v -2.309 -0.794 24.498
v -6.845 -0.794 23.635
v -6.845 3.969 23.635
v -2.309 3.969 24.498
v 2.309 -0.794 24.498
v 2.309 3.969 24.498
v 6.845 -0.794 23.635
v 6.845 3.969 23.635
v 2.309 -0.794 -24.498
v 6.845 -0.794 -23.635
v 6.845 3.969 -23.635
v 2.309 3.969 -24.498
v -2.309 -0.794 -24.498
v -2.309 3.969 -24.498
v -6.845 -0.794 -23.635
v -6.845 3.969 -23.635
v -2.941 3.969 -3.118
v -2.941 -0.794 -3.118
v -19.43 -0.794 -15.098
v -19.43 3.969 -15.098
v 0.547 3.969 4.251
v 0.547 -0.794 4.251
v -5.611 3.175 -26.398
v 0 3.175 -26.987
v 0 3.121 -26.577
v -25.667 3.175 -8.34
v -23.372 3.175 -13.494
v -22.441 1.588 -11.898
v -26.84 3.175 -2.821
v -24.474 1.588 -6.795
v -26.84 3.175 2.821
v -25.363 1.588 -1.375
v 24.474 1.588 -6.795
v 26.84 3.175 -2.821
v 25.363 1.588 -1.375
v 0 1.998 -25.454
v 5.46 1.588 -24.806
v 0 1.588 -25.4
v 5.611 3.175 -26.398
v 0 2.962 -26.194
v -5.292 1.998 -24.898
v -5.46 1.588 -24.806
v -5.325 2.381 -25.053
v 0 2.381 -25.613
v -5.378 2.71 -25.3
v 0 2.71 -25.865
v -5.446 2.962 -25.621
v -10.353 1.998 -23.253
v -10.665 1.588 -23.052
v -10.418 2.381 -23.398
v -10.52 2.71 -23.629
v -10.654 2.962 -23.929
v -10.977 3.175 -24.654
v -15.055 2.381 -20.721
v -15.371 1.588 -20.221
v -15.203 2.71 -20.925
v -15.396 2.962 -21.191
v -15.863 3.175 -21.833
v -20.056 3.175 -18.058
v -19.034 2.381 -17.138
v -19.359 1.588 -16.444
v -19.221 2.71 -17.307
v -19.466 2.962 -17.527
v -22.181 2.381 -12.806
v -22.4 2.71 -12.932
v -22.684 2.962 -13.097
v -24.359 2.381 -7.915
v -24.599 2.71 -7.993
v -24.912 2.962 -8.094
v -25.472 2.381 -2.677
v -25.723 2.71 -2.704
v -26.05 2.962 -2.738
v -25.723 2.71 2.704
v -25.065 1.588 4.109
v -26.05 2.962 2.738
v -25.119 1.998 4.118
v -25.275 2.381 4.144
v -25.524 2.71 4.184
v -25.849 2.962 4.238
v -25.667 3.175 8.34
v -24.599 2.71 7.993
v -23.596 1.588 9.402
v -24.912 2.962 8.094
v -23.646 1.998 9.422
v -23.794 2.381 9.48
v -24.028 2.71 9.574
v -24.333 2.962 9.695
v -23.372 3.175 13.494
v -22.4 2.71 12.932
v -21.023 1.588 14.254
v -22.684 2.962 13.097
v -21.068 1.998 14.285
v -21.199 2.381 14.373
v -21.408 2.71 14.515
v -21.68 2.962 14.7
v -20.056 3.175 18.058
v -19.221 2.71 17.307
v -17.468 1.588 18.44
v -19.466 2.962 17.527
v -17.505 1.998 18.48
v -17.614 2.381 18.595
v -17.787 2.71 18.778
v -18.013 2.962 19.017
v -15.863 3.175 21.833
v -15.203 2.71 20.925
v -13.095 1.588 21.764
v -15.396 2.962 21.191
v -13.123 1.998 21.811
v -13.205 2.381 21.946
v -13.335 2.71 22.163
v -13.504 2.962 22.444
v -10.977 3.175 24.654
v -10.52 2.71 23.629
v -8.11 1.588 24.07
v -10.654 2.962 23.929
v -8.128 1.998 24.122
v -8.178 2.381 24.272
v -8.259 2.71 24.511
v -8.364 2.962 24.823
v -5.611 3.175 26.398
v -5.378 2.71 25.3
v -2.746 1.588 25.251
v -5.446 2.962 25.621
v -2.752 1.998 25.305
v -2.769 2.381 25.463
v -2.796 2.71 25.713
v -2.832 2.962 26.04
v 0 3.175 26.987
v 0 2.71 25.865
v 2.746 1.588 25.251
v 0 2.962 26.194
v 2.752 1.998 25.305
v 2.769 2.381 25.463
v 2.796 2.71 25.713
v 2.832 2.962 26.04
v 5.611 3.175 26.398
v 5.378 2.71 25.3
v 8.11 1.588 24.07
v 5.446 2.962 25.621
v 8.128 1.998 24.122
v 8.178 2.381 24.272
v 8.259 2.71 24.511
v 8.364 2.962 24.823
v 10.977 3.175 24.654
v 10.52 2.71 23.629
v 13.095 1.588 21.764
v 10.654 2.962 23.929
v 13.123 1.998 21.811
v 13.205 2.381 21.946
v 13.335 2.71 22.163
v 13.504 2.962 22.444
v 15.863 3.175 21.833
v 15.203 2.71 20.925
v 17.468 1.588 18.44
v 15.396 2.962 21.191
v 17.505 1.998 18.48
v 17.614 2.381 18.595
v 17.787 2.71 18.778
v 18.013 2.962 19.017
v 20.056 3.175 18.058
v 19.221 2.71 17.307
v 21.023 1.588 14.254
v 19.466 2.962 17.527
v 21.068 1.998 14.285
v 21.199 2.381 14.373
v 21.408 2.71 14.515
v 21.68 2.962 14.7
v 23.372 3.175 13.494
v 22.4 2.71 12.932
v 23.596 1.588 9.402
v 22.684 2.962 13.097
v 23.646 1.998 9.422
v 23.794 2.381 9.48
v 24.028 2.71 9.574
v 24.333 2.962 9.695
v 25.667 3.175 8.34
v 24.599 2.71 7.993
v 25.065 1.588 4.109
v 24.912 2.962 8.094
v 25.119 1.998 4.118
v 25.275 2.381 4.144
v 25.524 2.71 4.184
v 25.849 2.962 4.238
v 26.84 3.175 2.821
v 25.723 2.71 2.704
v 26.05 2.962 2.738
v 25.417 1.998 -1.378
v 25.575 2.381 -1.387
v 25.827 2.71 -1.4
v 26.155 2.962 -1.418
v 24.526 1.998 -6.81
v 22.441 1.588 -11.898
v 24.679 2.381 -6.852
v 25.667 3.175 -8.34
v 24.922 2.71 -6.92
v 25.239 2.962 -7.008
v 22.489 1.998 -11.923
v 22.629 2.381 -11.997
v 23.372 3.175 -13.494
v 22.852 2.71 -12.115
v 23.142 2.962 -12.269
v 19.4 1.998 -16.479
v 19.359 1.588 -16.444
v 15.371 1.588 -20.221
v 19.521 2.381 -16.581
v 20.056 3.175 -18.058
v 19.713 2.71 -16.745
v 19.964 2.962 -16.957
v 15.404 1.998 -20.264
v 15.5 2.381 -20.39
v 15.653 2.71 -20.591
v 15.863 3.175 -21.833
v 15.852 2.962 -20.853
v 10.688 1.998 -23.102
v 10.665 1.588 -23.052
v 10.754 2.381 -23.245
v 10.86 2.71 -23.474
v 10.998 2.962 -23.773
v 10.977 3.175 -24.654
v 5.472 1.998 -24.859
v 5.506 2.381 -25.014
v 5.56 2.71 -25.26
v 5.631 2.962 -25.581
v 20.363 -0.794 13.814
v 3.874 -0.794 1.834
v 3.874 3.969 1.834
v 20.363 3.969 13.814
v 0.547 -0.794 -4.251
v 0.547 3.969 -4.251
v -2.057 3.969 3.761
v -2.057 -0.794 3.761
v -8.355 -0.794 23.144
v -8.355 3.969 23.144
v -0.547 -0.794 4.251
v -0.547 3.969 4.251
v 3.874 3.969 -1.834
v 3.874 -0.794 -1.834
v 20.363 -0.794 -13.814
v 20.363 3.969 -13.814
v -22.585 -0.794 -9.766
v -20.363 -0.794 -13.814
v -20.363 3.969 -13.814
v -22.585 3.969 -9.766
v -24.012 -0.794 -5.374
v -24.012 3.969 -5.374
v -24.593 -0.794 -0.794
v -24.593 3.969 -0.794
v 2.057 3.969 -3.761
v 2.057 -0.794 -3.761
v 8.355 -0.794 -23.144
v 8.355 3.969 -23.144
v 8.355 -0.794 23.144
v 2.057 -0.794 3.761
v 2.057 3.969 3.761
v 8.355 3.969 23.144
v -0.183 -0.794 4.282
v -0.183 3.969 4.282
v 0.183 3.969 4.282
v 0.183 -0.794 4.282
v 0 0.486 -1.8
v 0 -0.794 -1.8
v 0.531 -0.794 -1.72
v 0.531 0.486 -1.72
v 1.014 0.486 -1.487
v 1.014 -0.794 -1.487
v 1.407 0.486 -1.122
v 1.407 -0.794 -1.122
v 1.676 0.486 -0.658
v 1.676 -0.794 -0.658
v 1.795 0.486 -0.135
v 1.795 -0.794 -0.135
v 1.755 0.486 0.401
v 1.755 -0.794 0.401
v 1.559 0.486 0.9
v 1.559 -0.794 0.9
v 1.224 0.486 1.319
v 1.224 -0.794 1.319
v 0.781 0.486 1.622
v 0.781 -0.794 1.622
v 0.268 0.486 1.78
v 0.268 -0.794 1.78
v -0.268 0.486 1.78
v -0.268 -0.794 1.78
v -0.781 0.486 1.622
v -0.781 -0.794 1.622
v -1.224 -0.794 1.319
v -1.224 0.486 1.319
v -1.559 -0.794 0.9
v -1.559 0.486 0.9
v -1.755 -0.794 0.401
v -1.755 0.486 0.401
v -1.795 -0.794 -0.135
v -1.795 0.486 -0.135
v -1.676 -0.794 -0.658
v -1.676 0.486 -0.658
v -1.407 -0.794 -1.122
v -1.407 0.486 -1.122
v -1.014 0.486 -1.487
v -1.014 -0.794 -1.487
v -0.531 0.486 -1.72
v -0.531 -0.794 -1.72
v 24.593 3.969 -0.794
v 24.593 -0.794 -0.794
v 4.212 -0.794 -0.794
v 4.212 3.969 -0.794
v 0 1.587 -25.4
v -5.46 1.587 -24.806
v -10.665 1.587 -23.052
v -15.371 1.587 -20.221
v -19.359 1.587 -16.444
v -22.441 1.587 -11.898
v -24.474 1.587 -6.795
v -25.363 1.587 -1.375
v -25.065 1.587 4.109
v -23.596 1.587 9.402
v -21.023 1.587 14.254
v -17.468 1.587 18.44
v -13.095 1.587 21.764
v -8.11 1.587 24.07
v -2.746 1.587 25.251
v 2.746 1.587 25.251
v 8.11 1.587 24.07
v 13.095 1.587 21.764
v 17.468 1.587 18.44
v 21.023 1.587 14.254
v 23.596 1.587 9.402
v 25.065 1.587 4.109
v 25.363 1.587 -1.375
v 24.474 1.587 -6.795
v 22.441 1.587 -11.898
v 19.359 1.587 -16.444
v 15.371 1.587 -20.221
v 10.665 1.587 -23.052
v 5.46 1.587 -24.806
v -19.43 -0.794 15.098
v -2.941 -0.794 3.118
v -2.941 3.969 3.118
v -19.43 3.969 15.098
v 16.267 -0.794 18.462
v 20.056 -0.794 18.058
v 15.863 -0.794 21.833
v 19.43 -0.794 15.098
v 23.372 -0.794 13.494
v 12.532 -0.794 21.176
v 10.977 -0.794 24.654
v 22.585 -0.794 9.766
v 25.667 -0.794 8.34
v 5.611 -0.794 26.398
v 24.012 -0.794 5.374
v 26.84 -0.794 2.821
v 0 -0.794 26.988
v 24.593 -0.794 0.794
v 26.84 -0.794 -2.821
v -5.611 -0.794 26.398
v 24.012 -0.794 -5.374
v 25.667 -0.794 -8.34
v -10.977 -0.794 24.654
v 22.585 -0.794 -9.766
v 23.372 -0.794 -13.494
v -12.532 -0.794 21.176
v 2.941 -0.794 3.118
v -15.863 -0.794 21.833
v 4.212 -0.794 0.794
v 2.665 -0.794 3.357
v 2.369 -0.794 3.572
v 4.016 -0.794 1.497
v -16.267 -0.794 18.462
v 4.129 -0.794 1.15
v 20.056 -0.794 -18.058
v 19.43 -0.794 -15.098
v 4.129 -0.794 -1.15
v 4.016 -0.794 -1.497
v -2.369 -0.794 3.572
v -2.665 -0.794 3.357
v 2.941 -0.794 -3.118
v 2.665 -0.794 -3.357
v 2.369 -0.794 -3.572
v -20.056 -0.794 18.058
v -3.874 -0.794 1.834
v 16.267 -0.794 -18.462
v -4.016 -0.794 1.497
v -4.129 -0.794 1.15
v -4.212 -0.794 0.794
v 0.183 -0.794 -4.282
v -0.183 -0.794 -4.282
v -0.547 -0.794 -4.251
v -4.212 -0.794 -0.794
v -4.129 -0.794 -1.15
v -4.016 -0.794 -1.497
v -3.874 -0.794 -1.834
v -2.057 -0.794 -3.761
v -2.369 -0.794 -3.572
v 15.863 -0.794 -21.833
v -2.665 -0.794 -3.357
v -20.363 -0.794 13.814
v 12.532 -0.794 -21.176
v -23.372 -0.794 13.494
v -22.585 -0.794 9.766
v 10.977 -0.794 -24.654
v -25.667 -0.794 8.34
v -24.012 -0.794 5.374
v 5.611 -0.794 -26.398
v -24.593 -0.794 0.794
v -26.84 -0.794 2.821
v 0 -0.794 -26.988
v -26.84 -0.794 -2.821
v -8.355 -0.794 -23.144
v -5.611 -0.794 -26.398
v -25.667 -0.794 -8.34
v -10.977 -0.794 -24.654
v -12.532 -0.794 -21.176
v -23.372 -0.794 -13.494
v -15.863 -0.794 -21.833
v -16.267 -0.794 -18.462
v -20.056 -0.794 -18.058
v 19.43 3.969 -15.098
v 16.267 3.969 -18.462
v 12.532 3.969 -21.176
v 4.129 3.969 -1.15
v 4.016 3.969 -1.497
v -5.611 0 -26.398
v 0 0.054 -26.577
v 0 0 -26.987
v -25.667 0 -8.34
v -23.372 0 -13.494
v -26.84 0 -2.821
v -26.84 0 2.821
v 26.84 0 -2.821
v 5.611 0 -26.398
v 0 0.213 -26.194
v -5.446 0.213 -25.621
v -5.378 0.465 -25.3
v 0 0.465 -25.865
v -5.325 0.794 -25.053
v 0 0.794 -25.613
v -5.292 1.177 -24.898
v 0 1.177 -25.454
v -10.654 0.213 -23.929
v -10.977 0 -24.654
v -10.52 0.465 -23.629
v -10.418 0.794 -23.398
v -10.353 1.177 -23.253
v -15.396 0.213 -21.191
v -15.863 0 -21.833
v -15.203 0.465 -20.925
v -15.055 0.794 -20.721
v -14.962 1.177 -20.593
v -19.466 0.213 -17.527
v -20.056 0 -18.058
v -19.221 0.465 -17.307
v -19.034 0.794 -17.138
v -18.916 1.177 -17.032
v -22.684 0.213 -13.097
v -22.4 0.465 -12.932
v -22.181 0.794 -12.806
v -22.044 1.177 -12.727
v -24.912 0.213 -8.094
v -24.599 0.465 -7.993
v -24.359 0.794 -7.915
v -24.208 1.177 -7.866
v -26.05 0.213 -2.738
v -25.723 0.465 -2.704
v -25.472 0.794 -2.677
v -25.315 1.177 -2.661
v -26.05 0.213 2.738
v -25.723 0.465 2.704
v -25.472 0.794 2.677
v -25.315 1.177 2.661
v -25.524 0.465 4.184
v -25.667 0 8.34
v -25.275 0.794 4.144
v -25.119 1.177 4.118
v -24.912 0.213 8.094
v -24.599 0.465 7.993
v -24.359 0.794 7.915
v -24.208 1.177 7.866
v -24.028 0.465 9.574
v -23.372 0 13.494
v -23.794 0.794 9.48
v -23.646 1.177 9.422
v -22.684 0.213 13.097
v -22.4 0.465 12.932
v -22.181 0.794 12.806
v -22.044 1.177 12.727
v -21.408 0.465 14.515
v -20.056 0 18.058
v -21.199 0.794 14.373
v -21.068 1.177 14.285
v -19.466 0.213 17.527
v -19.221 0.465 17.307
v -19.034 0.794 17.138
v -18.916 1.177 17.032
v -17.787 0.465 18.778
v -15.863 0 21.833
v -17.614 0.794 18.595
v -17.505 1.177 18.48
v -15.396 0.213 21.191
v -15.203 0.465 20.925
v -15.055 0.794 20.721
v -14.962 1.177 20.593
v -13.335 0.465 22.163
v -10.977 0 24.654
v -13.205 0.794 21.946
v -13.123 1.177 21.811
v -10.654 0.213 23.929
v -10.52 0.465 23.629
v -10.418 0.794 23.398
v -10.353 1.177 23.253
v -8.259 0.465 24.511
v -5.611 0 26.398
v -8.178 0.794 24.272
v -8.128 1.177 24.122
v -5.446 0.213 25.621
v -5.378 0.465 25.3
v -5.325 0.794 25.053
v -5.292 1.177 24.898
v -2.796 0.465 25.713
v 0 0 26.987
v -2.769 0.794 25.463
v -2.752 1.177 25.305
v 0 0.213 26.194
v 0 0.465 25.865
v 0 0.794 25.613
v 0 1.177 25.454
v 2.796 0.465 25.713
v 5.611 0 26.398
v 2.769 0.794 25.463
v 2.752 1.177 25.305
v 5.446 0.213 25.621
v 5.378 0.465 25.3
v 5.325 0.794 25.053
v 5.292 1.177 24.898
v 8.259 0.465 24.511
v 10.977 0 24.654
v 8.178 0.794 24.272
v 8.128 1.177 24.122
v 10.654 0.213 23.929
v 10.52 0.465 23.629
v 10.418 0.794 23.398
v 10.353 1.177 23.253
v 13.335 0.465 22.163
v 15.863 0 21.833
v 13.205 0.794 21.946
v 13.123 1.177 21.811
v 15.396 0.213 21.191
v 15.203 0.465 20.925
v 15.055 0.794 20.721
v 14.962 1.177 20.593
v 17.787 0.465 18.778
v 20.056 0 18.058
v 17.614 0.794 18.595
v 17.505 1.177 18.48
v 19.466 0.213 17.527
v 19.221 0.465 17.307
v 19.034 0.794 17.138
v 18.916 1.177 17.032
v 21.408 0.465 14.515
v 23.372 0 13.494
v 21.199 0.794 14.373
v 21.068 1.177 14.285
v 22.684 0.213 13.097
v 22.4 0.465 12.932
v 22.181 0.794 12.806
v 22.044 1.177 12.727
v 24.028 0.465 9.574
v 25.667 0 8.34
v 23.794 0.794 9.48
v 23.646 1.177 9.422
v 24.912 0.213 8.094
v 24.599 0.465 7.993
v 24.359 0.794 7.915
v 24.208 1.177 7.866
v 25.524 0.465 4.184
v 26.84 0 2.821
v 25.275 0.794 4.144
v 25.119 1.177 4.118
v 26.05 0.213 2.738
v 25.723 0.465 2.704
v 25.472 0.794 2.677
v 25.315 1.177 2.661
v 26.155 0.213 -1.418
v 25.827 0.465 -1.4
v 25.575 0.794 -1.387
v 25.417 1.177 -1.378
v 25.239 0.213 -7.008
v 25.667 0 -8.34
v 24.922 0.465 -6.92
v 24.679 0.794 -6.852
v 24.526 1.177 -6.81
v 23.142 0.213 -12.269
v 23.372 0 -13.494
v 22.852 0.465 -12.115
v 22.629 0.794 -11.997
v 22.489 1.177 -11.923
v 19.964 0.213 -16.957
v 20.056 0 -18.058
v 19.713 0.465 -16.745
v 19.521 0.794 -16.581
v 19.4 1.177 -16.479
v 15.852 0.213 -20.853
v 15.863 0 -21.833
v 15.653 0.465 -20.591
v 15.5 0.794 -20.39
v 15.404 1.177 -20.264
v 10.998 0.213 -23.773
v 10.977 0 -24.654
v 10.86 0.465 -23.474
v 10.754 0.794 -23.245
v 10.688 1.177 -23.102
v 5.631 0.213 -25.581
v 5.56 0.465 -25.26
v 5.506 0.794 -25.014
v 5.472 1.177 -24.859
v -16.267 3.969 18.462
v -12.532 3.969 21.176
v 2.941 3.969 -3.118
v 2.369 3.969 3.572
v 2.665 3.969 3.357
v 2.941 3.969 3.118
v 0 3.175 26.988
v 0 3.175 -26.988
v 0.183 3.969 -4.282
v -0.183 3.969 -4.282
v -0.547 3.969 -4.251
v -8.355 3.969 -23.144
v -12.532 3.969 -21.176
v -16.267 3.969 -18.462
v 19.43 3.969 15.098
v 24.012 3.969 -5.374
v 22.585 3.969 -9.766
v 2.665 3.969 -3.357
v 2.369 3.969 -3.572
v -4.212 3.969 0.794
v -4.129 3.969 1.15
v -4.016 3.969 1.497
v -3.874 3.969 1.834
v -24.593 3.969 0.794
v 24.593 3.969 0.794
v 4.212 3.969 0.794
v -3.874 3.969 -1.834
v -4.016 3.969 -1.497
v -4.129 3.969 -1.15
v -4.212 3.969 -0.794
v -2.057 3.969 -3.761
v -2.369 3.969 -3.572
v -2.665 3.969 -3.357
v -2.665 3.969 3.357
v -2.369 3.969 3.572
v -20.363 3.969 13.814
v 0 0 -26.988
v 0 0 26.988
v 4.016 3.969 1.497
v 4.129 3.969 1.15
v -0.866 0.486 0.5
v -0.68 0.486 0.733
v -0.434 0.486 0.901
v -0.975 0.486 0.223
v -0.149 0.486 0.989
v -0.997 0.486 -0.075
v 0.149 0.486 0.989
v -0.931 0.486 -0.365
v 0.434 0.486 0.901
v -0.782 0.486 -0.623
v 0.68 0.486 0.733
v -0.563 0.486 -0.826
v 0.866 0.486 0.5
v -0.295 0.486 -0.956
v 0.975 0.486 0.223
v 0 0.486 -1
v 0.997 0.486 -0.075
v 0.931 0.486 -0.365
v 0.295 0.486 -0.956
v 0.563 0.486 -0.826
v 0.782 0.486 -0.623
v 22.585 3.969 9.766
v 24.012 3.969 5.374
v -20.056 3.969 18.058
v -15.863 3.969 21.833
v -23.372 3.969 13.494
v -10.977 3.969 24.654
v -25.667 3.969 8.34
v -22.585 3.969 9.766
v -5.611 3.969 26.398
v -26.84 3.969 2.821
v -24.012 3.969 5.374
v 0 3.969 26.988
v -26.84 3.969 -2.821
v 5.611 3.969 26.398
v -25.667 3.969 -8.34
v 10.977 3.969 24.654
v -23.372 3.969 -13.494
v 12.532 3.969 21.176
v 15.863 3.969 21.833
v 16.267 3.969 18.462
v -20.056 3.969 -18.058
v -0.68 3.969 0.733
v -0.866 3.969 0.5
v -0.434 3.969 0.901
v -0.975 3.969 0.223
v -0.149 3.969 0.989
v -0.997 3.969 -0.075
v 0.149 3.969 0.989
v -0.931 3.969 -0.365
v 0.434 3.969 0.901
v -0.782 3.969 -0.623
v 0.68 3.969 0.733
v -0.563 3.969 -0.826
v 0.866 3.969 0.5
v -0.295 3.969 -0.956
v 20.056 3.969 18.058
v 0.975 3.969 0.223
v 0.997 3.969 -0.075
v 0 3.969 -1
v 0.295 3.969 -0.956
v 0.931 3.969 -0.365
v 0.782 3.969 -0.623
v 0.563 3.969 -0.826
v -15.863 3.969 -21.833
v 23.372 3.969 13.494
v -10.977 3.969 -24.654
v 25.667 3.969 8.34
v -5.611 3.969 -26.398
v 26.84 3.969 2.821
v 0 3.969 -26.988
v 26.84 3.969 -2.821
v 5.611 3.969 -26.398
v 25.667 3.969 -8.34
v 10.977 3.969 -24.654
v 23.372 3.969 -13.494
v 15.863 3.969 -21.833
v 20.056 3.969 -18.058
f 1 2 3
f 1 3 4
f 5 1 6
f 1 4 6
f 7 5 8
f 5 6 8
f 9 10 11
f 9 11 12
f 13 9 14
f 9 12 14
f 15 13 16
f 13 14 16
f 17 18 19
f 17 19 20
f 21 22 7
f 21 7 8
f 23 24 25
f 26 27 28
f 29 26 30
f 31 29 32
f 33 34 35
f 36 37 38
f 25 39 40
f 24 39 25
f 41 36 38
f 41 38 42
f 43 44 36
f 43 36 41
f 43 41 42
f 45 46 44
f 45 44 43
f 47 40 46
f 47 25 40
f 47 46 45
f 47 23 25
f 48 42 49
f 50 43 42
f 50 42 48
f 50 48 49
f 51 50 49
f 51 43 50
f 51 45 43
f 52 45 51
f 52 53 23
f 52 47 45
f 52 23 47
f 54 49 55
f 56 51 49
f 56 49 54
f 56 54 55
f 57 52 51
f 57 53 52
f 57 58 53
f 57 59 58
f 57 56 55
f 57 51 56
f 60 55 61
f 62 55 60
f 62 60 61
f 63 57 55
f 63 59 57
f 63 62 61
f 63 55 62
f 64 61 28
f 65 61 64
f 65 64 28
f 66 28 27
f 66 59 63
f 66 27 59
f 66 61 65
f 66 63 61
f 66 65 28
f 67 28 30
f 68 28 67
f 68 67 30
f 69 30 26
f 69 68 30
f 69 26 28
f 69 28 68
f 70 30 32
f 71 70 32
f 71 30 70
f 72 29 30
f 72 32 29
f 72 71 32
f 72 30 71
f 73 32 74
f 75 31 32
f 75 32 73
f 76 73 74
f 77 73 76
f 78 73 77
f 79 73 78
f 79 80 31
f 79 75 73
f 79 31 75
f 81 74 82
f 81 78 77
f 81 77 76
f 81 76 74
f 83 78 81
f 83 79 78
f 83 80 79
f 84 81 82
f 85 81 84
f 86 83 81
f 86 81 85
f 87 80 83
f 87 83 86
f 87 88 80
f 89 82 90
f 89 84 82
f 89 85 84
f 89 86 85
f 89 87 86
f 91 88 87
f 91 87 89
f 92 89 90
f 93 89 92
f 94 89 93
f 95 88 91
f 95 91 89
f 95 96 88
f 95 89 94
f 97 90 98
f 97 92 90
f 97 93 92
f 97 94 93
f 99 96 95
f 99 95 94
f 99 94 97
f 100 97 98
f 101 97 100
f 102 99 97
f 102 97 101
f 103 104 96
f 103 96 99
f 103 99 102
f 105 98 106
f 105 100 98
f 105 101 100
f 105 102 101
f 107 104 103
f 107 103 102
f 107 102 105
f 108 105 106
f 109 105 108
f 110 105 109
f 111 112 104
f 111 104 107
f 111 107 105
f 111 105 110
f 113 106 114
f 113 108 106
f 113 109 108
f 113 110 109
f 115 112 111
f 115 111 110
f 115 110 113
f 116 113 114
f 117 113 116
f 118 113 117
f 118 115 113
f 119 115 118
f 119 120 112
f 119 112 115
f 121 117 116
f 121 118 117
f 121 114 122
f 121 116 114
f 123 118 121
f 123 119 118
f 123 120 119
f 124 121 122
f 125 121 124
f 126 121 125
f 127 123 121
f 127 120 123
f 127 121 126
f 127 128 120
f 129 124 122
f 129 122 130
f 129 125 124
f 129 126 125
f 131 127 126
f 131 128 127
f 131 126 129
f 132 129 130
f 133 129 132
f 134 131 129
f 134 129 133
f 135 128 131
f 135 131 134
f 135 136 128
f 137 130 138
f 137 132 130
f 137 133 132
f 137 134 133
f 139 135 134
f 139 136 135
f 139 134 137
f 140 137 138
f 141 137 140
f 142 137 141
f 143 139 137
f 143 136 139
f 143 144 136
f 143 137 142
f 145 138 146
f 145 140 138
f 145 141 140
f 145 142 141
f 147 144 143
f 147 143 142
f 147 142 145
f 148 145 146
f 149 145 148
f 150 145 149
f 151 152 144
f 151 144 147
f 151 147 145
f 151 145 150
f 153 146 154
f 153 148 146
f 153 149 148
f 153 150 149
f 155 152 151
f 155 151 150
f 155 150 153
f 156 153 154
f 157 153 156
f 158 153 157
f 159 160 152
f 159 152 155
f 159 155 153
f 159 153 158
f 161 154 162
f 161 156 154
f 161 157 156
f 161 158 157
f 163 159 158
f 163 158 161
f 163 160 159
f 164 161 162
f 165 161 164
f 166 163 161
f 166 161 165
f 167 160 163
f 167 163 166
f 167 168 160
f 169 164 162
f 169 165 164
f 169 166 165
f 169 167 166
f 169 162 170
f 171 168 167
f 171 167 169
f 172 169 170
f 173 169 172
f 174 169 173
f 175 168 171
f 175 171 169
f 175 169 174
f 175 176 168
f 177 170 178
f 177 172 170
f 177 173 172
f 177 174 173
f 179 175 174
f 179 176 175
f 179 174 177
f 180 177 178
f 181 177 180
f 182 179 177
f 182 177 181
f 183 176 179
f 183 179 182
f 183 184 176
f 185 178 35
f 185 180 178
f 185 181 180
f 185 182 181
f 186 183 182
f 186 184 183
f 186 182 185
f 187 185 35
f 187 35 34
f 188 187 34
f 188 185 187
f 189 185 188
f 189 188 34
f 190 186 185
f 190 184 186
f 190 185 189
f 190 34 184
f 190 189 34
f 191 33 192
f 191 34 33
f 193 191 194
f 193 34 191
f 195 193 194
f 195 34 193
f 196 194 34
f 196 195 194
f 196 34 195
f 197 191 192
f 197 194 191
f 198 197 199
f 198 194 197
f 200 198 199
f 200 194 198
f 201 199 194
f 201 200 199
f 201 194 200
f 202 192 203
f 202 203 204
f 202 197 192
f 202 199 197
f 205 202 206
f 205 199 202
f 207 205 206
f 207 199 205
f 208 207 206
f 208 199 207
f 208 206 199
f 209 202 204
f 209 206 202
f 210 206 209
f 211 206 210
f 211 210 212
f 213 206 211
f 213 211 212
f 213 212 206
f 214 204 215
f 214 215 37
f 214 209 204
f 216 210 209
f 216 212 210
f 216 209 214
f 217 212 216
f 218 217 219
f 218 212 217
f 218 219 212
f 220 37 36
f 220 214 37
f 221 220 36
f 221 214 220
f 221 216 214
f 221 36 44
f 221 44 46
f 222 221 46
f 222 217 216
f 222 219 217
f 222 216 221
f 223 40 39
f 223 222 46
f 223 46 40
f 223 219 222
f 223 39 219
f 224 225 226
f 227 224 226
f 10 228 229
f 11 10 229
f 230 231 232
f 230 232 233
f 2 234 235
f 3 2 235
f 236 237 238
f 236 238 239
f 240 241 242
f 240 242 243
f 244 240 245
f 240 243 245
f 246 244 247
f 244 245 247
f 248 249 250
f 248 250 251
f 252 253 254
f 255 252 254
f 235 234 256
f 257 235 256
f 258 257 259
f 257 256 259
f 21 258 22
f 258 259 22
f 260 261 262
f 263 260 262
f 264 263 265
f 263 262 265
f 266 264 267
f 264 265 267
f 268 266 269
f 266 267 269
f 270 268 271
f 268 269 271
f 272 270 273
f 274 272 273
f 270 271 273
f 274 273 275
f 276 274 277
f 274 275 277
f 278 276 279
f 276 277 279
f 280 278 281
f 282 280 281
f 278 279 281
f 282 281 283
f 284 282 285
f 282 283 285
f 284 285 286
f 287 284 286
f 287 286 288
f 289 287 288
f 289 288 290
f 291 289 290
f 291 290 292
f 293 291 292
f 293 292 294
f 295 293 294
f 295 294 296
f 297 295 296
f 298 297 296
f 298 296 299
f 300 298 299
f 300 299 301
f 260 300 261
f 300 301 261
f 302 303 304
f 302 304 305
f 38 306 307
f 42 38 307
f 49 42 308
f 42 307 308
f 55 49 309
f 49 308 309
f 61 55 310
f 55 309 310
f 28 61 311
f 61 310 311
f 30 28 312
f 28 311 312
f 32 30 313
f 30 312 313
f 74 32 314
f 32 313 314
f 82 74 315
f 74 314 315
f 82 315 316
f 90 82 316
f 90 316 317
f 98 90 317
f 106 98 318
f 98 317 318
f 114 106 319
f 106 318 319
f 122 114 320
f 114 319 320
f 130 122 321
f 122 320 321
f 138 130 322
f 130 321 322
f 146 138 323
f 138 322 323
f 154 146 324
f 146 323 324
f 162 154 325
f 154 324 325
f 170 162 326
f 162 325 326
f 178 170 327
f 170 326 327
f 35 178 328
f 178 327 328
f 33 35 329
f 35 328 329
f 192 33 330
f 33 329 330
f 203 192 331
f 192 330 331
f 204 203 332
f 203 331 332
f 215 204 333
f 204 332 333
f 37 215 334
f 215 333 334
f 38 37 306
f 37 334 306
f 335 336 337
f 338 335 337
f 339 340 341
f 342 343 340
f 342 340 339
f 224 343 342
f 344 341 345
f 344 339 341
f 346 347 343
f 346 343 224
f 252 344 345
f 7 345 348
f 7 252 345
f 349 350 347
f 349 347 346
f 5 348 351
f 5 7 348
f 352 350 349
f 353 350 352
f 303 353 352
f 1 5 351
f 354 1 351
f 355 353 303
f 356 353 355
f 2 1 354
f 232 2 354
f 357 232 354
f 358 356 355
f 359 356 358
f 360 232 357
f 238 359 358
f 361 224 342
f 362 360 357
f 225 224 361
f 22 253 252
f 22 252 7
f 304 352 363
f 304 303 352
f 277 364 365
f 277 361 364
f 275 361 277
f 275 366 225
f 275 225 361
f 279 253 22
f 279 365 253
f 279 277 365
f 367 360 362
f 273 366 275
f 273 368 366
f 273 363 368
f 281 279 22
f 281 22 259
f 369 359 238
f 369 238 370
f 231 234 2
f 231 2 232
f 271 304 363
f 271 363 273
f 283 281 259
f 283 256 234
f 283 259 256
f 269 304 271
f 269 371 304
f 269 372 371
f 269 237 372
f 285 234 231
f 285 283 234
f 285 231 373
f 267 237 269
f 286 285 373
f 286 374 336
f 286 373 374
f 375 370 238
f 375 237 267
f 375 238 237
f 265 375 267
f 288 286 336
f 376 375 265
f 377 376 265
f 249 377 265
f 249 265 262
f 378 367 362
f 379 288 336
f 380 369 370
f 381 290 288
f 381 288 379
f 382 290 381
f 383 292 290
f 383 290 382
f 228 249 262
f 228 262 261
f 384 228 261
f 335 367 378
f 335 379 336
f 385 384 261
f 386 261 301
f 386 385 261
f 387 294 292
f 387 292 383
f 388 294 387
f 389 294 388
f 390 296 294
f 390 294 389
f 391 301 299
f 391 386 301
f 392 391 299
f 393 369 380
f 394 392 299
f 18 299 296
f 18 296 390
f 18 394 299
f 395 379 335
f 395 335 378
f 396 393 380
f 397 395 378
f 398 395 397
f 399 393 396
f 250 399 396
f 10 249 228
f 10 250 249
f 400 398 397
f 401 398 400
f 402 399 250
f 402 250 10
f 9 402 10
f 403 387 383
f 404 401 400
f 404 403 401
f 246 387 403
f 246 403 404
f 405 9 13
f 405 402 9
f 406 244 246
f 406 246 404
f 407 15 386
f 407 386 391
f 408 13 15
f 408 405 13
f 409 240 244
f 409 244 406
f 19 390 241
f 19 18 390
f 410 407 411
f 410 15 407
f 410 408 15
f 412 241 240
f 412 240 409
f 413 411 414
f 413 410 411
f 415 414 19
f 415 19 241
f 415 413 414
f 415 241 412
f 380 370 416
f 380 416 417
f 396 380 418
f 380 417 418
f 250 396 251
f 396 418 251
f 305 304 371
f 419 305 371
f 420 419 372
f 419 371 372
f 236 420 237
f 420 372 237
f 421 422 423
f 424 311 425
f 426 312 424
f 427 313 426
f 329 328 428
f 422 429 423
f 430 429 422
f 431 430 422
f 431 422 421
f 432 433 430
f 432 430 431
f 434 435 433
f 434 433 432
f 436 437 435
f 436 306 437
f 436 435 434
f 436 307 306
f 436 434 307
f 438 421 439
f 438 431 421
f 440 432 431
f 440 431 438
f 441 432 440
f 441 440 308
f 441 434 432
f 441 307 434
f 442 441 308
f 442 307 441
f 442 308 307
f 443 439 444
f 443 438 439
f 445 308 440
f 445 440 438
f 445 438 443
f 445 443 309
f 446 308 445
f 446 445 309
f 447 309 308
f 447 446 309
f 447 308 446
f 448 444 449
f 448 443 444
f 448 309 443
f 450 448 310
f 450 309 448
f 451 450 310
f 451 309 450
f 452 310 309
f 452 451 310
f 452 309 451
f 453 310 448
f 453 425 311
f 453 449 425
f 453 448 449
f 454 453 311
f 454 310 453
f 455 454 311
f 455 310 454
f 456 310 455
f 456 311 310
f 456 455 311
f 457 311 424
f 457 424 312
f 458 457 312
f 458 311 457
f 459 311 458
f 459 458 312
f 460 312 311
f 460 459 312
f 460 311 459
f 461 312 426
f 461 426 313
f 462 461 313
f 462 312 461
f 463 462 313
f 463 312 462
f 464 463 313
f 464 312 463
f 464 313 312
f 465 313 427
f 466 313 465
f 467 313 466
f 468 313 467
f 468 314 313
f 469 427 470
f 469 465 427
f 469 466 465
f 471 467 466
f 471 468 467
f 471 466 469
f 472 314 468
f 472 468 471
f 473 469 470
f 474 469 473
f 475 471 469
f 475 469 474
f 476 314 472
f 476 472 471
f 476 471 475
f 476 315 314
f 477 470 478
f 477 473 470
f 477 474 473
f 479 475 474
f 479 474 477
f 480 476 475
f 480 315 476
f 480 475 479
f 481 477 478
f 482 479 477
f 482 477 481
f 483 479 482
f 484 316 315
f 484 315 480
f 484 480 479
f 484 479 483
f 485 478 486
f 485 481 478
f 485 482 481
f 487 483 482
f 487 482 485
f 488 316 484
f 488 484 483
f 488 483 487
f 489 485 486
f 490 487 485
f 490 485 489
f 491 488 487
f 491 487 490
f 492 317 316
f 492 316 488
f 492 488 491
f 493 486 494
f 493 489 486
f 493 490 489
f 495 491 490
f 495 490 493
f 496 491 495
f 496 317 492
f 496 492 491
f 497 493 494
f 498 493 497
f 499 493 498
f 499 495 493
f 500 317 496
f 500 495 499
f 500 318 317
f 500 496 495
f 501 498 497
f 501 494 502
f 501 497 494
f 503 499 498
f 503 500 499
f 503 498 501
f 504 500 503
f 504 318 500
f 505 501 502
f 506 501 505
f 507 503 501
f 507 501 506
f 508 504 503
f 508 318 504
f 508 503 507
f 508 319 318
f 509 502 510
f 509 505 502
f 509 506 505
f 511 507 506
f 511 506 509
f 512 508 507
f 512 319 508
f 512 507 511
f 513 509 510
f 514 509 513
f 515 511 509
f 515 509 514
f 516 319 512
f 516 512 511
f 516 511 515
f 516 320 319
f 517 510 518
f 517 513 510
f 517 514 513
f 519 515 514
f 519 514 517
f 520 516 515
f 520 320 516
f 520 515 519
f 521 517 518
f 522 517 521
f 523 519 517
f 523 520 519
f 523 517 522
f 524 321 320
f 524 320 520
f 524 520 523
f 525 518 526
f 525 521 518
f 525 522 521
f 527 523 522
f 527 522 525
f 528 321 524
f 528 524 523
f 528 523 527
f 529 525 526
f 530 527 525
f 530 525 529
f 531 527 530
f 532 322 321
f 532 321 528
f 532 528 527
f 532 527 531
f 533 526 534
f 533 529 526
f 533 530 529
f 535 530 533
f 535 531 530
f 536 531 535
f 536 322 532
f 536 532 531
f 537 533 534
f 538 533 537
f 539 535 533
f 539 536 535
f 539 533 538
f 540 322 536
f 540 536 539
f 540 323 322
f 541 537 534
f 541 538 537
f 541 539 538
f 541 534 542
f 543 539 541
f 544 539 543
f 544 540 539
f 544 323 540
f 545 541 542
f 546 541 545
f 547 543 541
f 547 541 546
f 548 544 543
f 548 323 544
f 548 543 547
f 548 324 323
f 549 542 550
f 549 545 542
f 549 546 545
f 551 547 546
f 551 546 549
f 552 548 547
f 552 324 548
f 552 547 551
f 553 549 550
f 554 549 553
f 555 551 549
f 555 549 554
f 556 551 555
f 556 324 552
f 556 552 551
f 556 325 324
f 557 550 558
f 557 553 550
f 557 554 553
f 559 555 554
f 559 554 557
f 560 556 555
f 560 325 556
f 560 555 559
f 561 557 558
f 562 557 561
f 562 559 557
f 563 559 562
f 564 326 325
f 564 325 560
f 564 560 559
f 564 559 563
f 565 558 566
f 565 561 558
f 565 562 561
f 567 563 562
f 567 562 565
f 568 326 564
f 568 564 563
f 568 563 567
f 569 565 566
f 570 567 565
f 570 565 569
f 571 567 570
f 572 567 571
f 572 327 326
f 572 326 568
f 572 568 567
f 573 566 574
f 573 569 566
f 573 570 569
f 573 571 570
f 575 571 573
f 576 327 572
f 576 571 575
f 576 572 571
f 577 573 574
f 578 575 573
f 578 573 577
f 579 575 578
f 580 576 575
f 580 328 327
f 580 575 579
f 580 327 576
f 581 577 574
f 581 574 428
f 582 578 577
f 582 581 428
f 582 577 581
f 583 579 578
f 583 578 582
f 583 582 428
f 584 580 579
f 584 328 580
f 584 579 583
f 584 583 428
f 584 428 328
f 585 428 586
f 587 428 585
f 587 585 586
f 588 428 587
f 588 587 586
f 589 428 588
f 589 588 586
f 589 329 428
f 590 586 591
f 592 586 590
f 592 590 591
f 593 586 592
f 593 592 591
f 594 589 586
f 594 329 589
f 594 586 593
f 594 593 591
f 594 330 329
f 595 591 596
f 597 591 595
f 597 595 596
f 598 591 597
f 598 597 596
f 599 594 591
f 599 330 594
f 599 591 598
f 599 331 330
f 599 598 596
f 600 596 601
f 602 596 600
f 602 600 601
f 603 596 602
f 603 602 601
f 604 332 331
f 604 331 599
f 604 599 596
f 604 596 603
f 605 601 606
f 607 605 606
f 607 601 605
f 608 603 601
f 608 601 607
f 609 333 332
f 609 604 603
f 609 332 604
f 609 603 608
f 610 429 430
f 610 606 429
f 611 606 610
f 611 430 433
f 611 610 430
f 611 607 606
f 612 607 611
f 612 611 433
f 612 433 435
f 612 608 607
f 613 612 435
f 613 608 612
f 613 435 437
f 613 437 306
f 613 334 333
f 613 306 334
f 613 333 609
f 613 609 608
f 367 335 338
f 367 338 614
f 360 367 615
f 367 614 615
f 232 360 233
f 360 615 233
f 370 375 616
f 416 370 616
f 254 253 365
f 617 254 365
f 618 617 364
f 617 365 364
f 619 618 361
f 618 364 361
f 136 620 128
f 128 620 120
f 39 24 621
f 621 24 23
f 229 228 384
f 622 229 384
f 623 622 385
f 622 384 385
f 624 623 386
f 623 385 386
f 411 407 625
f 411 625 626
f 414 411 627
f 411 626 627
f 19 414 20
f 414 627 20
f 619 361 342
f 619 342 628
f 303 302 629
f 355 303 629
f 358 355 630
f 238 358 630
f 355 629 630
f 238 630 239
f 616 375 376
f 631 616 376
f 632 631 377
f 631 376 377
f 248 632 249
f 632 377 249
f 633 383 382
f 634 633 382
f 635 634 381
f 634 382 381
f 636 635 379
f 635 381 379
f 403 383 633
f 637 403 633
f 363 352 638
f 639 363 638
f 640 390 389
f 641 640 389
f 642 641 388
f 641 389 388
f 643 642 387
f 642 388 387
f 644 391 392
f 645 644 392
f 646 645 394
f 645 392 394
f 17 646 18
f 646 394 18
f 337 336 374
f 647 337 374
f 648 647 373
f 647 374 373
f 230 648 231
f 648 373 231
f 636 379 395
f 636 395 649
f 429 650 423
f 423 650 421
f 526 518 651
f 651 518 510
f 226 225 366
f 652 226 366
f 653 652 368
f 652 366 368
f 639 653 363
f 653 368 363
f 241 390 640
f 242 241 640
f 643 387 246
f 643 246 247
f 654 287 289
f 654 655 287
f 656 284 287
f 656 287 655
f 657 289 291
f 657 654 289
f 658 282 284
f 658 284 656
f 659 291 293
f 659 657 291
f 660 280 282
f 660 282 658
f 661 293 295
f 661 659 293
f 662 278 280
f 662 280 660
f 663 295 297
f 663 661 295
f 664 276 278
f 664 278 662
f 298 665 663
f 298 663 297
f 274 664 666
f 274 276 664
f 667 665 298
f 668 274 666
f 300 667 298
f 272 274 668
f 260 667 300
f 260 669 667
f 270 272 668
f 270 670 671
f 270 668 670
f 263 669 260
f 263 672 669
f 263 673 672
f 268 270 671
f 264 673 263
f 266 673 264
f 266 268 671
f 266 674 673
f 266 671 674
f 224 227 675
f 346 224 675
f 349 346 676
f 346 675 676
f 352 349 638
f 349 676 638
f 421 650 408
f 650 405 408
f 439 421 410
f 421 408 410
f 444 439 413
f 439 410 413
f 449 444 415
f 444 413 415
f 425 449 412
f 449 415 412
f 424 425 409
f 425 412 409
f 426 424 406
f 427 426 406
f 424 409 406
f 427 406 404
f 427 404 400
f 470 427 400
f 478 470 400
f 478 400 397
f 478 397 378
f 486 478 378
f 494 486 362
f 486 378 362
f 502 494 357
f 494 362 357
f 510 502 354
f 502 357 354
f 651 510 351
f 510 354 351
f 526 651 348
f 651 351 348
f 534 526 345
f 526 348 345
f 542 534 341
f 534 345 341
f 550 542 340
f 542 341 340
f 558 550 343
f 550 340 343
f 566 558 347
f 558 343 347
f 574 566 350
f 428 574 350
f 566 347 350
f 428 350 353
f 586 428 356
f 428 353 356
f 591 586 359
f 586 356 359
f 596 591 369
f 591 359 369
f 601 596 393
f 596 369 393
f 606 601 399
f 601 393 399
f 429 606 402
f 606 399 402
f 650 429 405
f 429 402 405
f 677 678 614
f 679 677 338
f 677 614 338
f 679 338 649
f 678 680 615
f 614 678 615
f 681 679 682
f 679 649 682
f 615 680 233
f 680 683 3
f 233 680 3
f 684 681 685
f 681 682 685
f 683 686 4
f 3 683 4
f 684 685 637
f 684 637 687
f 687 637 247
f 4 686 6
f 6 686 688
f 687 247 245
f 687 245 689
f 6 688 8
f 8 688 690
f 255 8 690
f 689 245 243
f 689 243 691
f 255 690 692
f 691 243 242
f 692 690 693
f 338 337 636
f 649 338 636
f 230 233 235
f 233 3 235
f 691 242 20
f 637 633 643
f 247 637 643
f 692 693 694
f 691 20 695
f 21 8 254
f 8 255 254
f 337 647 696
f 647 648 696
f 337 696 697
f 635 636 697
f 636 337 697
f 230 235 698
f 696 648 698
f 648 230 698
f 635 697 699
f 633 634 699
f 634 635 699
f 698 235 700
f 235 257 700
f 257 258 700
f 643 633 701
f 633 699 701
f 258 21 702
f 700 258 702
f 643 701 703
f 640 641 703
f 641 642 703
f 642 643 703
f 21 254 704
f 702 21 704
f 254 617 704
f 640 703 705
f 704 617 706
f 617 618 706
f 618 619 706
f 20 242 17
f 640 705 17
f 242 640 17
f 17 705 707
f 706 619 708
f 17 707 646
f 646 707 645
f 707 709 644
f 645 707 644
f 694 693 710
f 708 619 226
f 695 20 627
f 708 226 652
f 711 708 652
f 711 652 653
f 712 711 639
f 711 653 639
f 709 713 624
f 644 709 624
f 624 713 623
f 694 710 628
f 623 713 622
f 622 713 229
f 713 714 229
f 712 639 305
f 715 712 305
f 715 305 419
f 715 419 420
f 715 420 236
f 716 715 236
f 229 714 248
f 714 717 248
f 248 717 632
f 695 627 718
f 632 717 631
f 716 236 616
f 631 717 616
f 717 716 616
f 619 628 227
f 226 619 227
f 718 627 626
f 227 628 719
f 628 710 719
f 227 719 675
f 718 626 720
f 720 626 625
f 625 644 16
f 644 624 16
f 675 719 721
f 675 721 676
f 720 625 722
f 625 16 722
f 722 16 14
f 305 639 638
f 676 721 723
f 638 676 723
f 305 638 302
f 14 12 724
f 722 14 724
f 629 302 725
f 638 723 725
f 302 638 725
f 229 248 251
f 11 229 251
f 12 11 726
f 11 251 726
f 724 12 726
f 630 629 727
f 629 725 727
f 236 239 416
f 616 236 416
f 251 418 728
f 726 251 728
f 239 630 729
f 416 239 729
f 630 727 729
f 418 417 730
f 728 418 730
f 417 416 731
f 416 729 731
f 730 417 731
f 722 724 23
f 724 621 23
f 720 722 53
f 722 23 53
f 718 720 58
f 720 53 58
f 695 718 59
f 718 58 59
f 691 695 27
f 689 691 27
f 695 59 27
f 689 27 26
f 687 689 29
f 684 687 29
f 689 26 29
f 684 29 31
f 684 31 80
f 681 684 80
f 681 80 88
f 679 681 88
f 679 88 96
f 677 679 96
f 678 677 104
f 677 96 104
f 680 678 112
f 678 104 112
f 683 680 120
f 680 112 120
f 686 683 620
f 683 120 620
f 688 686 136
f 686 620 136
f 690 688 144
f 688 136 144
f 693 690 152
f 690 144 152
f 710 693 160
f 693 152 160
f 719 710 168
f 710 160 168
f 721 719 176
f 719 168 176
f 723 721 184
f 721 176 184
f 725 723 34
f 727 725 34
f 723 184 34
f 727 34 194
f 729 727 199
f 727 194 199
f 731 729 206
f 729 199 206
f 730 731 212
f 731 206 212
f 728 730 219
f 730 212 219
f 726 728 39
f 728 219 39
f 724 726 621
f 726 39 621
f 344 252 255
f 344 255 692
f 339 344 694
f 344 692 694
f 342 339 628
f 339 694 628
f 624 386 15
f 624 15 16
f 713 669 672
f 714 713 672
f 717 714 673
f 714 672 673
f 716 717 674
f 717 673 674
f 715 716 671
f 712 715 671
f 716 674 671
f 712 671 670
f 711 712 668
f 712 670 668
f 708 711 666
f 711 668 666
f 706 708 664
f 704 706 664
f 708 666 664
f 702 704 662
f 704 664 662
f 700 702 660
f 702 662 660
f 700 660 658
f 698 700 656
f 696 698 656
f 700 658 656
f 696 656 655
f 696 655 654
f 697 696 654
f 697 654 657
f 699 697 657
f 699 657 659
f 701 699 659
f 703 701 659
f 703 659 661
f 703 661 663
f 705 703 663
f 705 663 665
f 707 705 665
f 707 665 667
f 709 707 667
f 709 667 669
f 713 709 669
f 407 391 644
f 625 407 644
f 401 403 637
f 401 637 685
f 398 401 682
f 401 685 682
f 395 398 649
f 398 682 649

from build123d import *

# Parameters (mm, degrees)
INNERWHEEL_START                            = -0.79375
INNERWHEEL_OUTLINE_R                        = 4.28625
INNERWHEEL_OUTLINE_R_2                      = 3.01625
INNERWHEEL_DEPTH                            = 4.7625
CONNECTIONINNEROUTER_REACH                  = 43.498
CONNECTIONINNEROUTER_END_RADIUS             = 24.60625
SKETCH3_W                                   = 1.5875
SKETCH3_H                                   = 4.7625
CONNECTIONINNEROUTER_DIRECTION_2_REACH      = 43.498
CONNECTIONINNEROUTER_DIRECTION_2_END_RADIUS = 4.28625
CIRCULARPATTERN_COUNT                       = 10
SKETCH4_R                                   = 3.01625
FILLHOLE_DEPTH                              = 4.7625
M2SCREWHOLE_REACH                           = 40.462
M2SCREWDHOLE_R                              = 1
M2SCREWDKHEAD_R                             = 1.8
M2SCREWHEAD_DEPTH                           = 1.28
FILLET_2_R                                  = 1.5875


# Read off the part's stored shape, not the designer's step: InnerWheel
with BuildPart() as part:
    # OuterWheelSketch → OuterWheel (revolve)
    with BuildSketch(Plane.XY, mode=Mode.PRIVATE) as outerwheel_sk:
        Polygon((-25.4, 0), (-26.9875, 0), (-26.9875, -0.79375), (-24.60625, -0.79375), (-24.60625, 3.96875), (-26.9875, 3.96875), (-26.9875, 3.175), (-25.4, 3.175), align=None)
    revolve(outerwheel_sk.sketch.rotate(Axis((0, -1.962659061, 0), (0, 1, 0)), 270), axis=Axis((0, -1.962659061, 0), (0, 1, 0)))



with BuildPart() as body_2:
    # InnerWheel outline → InnerWheel (new body)
    with BuildSketch(Plane(origin=(0, 0, 0), x_dir=(1, 0, 0), z_dir=(0, 1, 0)).offset(INNERWHEEL_START)):
        Circle(INNERWHEEL_OUTLINE_R)
        Circle(INNERWHEEL_OUTLINE_R_2, mode=Mode.SUBTRACT)
    extrude(amount=INNERWHEEL_DEPTH)


with BuildPart() as part_1:
    add(part.part)

    add(body_2.part)  # ConnectionInnerOuter merges body 2
    # ConnectionInnerOuter: up to this cylinder (the profile starts inside it)
    connectioninnerouter_end = Plane(origin=(0, 1.5875, 0), z_dir=(0, -1, 0)) * Cylinder(CONNECTIONINNEROUTER_END_RADIUS, 137.2085, mode=Mode.PRIVATE)
    # Sketch3 → ConnectionInnerOuter (add, up to the surface)
    with BuildSketch(Plane(origin=(4.28625, 0, 0), x_dir=(0, 0, -1), z_dir=(1, 0, 0)), mode=Mode.PRIVATE) as connectioninnerouter_sk1:
        with Locations((0, 1.5875)):
            Rectangle(SKETCH3_W, SKETCH3_H)
    connectioninnerouter_tool1 = extrude(connectioninnerouter_sk1.sketch, amount=CONNECTIONINNEROUTER_REACH, mode=Mode.PRIVATE) & connectioninnerouter_end
    connectioninnerouter = connectioninnerouter_tool1.solids().sort_by_distance((4.28625, 1.5875, 0))[0]
    add(connectioninnerouter)

    # ConnectionInnerOuter direction 2: up to this cylinder (the profile starts outside it)
    connectioninnerouter_direction_2_end = Plane(origin=(0, 1.5875, 0), z_dir=(0, -1, 0)) * Cylinder(CONNECTIONINNEROUTER_DIRECTION_2_END_RADIUS, 96.5685, mode=Mode.PRIVATE)
    # Sketch3 → ConnectionInnerOuter direction 2 (add, up to the surface)
    with BuildSketch(Plane(origin=(4.28625, 0, 0), x_dir=(0, 0, -1), z_dir=(1, 0, 0)), mode=Mode.PRIVATE) as connectioninnerouter_direction_2_sk1:
        with Locations((0, 1.5875)):
            Rectangle(SKETCH3_W, SKETCH3_H)
    connectioninnerouter_direction_2_tool1 = extrude(connectioninnerouter_direction_2_sk1.sketch, amount=-CONNECTIONINNEROUTER_DIRECTION_2_REACH, mode=Mode.PRIVATE) - connectioninnerouter_direction_2_end
    connectioninnerouter_direction_2 = connectioninnerouter_direction_2_tool1.solids().sort_by_distance((4.28625, 1.5875, 0))[0] + connectioninnerouter_direction_2_tool1.solids().sort_by_distance((4.28625, 1.5875, 0))[1]
    add(connectioninnerouter_direction_2)
    connectioninnerouter = connectioninnerouter + connectioninnerouter_direction_2  # both directions under the feature's name, for the pattern or mirror that repeats it

    # CircularPattern: ConnectionInnerOuter ×10 about axis
    circularpattern_axis = Axis((0, 0, 0), (0, 1, 0))
    for i in range(1, CIRCULARPATTERN_COUNT):
        add(connectioninnerouter.rotate(circularpattern_axis, i * 360 / CIRCULARPATTERN_COUNT))

    # Sketch4 → FillHole (add)
    with BuildSketch(Plane(origin=(0, -0.79375, 0), x_dir=(-1, 0, 0), z_dir=(0, -1, 0))):
        Circle(SKETCH4_R)
    extrude(amount=-FILLHOLE_DEPTH)

    # M2ScrewDHole → M2ScrewHole (cut, up to next)
    with BuildSketch(Plane(origin=(0, -0.79375, 0), x_dir=(-1, 0, 0), z_dir=(0, -1, 0)), mode=Mode.PRIVATE) as m2screwhole_sk1:
        with Locations(Location((0, 0, 0), (0, 0, 90))):
            Circle(M2SCREWDHOLE_R)
    m2screwhole_tool1 = extrude(m2screwhole_sk1.sketch, amount=-M2SCREWHOLE_REACH, mode=Mode.PRIVATE) & part_1.part
    add(m2screwhole_tool1.solids().sort_by_distance((0, -0.79375, 0))[0], mode=Mode.SUBTRACT)

    # M2ScrewDKHead → M2ScrewHead (cut)
    with BuildSketch(Plane(origin=(0, -0.79375, 0), x_dir=(-1, 0, 0), z_dir=(0, -1, 0))):
        with Locations(Location((0, 0, 0), (0, 0, 90))):
            Circle(M2SCREWDKHEAD_R)
    extrude(amount=-M2SCREWHEAD_DEPTH, mode=Mode.SUBTRACT)

    # Fillet 2
    fillet_2_edges = [part_1.edges().sort_by_distance(p)[0] for p in [
        (0, 0, 25.4),
        (0, 3.175, 25.4),
    ]]
    fillet(fillet_2_edges, radius=FILLET_2_R - 0.0001)  # a hair under: the kernel refuses the full size


solid = part_1.part
